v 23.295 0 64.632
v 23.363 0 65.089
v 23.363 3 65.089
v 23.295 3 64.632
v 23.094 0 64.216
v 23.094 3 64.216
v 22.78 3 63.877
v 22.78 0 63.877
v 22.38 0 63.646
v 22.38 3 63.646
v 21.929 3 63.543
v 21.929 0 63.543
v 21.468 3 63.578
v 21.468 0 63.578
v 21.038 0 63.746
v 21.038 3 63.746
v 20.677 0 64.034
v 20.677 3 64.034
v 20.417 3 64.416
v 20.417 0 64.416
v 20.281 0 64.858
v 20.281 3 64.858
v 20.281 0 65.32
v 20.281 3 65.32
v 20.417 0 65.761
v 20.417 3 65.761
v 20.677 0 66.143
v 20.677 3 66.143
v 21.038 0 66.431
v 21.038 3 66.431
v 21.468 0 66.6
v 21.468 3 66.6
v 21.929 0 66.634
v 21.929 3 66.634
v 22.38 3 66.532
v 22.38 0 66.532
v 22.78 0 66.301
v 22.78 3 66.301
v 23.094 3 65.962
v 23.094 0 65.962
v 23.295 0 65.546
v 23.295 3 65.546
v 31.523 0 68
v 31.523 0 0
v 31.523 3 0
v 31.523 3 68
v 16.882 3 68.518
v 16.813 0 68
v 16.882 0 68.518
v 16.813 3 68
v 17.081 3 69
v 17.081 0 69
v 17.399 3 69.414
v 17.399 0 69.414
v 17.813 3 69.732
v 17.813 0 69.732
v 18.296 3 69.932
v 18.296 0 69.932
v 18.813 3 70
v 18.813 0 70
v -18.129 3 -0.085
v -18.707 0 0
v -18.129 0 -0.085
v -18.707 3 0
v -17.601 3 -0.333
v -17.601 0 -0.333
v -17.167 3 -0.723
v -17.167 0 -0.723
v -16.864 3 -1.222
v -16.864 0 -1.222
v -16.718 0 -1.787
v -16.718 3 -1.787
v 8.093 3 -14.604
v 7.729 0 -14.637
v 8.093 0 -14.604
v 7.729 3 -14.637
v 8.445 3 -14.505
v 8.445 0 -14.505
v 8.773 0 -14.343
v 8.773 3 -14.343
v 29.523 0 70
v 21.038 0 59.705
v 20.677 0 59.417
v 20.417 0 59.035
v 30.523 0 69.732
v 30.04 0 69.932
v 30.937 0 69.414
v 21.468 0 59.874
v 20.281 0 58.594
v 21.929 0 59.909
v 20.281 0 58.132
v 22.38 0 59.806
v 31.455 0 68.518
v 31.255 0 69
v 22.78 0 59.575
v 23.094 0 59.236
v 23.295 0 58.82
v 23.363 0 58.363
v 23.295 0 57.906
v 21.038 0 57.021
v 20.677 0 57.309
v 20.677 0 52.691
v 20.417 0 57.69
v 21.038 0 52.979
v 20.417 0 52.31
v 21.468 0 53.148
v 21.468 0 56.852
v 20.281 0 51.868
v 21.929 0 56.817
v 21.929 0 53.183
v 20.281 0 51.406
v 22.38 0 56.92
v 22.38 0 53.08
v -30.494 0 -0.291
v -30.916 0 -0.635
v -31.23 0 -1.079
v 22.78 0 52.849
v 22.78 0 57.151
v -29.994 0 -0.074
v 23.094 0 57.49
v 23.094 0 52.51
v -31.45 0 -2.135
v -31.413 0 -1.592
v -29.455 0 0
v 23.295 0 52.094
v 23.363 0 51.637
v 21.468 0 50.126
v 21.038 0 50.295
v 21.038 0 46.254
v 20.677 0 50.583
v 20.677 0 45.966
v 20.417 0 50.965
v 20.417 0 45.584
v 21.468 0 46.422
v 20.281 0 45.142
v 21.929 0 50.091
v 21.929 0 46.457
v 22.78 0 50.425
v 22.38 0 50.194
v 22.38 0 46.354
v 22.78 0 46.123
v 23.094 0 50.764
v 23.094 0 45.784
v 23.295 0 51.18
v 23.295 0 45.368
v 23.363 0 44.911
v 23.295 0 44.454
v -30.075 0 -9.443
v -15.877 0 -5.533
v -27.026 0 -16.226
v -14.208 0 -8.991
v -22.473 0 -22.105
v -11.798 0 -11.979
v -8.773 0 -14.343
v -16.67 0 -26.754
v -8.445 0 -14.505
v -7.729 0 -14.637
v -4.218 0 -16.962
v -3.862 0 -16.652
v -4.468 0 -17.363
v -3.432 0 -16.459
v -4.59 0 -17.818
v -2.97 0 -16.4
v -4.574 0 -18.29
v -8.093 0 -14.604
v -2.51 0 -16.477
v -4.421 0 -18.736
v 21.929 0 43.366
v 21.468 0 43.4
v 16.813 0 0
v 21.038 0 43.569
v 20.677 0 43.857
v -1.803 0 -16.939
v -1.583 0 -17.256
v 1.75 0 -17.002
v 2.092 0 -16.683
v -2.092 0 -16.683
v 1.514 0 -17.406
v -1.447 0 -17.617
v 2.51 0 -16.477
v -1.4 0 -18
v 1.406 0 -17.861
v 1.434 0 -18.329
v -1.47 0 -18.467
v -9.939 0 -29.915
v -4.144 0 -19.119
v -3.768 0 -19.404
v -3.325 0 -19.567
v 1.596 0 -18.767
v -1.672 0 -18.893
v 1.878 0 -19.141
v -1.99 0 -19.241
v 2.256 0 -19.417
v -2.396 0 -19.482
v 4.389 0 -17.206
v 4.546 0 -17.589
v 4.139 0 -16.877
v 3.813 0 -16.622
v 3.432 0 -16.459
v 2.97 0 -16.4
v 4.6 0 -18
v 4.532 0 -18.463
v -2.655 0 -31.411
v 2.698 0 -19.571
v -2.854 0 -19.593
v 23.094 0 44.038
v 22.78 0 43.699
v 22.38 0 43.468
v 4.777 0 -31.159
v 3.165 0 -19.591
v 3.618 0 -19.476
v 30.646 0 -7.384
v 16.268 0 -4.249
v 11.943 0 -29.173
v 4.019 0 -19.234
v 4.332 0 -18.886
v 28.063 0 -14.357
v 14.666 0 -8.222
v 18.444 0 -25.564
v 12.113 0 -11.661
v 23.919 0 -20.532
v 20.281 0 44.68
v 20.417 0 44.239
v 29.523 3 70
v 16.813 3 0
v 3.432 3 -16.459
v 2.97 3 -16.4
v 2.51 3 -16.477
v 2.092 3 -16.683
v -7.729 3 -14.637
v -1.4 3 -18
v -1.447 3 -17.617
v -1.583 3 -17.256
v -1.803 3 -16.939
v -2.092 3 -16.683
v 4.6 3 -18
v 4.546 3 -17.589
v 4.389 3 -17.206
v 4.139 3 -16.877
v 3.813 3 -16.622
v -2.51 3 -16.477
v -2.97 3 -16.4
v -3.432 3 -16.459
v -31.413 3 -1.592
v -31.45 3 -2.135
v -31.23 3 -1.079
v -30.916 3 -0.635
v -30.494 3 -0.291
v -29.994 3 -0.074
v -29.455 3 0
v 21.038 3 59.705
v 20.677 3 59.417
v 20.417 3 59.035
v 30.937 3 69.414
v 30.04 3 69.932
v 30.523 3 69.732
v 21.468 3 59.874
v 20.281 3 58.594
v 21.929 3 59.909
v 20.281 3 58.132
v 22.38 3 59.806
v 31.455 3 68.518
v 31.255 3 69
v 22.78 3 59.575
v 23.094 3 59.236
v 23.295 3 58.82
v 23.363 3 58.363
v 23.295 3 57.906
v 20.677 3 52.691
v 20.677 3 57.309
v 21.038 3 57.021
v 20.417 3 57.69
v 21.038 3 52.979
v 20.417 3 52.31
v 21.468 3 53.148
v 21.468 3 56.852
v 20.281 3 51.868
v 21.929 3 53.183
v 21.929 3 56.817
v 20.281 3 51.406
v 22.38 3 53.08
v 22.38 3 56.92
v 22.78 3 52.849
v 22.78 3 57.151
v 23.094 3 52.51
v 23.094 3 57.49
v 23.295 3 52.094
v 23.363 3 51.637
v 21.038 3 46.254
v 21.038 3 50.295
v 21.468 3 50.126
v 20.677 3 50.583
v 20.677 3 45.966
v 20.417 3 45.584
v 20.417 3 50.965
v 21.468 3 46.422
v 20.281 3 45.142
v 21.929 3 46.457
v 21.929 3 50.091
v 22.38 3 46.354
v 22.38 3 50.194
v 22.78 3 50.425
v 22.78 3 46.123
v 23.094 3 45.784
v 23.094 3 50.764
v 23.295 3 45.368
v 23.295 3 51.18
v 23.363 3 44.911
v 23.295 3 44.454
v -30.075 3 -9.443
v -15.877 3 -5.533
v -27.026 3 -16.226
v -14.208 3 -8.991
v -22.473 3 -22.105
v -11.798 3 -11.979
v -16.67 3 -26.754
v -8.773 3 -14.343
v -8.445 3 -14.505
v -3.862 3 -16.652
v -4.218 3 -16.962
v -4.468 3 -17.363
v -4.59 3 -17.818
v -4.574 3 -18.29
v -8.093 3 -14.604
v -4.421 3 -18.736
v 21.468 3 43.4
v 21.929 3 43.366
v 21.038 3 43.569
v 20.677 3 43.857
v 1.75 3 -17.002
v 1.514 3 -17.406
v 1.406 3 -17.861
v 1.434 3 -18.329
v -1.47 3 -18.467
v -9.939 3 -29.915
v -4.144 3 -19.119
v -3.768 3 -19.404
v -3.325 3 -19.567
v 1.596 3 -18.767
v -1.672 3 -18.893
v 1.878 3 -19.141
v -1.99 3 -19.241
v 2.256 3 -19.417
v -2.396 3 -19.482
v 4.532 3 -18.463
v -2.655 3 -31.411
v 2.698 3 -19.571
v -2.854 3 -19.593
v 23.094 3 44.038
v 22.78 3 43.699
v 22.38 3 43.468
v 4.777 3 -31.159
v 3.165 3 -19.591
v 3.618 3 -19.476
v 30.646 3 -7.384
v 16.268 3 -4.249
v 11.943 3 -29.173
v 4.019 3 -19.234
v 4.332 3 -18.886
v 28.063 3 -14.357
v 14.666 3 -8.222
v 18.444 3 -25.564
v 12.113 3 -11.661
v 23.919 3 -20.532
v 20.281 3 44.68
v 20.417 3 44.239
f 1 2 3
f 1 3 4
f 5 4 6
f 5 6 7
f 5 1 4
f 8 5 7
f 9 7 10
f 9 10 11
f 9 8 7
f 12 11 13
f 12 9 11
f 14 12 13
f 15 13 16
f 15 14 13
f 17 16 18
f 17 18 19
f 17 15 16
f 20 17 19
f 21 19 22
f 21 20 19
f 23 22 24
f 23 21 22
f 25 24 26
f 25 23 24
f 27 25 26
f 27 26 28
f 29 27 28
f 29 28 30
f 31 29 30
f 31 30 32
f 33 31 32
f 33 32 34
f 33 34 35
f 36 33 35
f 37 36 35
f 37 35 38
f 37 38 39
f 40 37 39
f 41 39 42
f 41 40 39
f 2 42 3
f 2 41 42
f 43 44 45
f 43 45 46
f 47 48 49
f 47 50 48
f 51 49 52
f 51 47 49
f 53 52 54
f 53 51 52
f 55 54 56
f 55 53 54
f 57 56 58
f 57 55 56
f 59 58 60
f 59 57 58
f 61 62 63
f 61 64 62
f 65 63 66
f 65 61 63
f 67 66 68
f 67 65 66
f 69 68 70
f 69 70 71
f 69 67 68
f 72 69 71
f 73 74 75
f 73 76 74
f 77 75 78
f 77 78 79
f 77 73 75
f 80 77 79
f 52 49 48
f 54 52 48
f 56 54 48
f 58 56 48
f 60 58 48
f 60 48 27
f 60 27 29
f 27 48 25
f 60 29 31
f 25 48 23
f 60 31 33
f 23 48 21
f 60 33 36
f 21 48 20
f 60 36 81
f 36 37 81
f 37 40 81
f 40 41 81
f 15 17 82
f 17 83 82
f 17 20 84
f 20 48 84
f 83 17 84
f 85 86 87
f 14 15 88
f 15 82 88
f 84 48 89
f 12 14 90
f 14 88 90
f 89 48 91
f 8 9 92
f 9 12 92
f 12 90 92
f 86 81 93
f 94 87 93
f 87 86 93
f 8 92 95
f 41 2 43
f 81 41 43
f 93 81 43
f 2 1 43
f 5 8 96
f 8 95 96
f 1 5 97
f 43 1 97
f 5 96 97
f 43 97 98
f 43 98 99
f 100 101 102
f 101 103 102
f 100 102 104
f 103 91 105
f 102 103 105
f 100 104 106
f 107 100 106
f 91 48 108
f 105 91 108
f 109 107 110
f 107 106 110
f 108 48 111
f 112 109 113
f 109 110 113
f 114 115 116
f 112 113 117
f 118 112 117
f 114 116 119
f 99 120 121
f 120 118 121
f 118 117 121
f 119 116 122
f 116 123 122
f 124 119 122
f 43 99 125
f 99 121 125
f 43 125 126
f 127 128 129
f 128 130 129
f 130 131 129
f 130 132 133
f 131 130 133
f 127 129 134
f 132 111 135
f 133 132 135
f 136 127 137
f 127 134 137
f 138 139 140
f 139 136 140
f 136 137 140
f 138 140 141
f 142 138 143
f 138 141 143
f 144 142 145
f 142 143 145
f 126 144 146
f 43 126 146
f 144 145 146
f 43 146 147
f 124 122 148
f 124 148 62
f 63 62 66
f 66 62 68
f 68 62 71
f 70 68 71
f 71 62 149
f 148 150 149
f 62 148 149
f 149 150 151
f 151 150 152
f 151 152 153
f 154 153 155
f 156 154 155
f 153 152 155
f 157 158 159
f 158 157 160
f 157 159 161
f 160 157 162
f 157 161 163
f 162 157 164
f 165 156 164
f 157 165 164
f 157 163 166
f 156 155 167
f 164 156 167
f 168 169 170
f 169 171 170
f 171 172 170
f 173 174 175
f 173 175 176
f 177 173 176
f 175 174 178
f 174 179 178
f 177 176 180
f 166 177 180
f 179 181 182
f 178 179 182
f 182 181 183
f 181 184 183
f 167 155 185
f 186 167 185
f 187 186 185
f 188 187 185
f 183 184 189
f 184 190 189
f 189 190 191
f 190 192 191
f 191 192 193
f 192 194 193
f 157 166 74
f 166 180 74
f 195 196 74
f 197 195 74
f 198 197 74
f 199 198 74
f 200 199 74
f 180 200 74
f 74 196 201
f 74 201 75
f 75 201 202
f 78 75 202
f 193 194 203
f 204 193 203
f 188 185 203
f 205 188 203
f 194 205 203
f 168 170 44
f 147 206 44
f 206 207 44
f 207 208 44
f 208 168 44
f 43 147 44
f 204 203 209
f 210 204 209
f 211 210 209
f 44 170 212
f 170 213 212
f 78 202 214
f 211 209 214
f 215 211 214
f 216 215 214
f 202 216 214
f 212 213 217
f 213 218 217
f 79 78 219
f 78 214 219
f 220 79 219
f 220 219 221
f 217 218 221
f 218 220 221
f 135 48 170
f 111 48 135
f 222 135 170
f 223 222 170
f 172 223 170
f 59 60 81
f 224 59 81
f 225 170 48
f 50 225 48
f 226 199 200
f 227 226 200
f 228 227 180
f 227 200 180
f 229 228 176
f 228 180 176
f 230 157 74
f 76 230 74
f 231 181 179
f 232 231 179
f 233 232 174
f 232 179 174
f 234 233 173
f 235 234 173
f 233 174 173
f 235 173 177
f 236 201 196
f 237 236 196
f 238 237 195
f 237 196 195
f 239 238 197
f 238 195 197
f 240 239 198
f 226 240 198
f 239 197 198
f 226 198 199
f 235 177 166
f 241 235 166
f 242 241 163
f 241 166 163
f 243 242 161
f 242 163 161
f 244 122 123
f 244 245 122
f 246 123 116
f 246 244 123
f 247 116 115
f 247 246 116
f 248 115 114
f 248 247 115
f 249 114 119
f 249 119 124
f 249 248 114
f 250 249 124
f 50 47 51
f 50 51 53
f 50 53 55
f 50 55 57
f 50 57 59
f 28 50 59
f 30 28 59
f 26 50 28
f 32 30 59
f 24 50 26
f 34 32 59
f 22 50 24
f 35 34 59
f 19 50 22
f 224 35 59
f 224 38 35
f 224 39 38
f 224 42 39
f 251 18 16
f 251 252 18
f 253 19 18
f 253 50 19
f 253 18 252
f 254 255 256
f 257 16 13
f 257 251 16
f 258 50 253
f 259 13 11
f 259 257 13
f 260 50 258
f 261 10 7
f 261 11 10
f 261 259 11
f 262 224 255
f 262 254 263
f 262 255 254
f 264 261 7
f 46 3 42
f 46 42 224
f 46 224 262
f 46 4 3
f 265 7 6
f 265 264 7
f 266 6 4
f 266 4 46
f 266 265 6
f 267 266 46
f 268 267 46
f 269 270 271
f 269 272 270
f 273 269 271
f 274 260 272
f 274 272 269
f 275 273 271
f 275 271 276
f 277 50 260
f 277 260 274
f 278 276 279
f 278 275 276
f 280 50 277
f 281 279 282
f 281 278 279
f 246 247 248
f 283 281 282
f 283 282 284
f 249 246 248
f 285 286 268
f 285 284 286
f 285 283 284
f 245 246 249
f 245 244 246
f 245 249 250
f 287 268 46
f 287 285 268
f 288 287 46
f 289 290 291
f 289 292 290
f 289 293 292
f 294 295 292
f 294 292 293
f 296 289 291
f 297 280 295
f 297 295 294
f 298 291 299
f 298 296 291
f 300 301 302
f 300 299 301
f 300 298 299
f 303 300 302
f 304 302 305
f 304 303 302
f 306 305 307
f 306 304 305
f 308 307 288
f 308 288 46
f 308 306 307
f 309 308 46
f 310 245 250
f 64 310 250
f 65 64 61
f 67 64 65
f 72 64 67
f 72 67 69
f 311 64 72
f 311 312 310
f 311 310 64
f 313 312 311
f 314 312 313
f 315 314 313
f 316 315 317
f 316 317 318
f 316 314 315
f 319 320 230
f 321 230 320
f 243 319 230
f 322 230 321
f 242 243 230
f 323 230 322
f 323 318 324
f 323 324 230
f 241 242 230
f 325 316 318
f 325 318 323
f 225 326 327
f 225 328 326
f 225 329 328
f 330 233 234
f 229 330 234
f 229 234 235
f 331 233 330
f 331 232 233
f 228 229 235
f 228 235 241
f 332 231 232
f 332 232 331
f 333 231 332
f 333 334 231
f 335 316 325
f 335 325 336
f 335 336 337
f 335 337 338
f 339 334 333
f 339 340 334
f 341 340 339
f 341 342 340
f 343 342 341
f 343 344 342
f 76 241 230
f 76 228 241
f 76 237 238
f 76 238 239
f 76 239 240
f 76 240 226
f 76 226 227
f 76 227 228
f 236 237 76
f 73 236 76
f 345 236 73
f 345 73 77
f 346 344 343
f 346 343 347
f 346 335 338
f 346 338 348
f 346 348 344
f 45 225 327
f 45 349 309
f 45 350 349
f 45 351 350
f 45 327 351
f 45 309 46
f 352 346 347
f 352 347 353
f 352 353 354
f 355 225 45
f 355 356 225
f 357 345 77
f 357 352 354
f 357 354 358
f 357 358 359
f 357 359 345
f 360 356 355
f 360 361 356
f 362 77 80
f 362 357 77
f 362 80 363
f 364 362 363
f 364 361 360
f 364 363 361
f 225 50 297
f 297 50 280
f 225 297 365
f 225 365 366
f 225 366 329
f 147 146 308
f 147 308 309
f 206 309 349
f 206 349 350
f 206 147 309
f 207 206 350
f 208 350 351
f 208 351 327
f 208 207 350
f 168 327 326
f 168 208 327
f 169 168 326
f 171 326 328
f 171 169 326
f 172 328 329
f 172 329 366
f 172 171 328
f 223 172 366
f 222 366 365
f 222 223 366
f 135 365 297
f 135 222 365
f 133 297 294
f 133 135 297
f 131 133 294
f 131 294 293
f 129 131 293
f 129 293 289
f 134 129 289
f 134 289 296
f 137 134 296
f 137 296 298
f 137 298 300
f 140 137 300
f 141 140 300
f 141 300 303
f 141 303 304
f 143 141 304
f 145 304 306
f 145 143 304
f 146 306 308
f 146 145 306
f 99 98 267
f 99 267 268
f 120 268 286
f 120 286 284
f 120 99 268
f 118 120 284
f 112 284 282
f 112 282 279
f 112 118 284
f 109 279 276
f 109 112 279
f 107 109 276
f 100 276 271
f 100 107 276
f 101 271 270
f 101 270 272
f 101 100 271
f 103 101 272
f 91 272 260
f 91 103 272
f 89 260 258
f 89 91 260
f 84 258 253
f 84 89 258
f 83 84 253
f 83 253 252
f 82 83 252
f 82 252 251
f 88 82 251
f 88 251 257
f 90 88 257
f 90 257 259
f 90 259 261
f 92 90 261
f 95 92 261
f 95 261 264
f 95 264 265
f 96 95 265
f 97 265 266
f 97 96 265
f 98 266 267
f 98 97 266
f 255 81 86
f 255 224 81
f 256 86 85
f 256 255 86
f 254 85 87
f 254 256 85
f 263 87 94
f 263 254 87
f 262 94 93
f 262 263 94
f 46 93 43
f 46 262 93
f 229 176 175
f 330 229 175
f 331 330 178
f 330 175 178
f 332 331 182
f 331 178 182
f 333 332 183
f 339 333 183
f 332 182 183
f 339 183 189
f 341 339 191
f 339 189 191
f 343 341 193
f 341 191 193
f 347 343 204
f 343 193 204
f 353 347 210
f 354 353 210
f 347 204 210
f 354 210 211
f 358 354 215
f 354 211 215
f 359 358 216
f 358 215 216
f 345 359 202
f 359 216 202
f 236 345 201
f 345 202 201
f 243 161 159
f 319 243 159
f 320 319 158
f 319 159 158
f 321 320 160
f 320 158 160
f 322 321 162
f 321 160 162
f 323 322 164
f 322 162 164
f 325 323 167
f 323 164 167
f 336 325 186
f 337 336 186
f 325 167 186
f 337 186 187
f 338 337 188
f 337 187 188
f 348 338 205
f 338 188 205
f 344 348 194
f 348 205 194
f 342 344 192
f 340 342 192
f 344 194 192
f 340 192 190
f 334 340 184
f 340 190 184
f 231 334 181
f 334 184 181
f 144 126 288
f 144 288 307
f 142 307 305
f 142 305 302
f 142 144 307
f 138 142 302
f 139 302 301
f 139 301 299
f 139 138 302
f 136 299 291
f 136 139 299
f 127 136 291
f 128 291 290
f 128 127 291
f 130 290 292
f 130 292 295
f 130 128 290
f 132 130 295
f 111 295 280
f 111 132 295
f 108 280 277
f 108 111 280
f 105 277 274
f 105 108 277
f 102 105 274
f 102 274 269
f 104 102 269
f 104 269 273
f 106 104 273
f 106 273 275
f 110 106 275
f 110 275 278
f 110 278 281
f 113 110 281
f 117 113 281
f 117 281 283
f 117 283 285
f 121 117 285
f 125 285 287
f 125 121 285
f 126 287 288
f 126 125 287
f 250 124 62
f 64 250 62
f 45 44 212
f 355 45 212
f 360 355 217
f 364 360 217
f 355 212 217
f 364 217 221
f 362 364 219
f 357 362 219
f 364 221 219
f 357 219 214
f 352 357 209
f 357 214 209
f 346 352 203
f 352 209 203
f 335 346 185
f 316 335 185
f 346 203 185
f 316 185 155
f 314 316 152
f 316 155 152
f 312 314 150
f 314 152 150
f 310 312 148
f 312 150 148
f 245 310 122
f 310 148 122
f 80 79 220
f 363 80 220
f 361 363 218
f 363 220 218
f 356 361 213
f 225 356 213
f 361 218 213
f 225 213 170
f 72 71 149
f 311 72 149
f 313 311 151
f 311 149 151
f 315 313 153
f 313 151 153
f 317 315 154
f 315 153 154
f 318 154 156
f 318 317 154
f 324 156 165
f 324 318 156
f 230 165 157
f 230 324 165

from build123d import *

# Parameters (mm, degrees)
SKETCH2_R           = 1.55
BOSS_EXTRUDE1_DEPTH = 3
FILLET1_R           = 2


with BuildPart() as part:
    # Sketch2 → Boss-Extrude1 (new body)
    with BuildSketch(Plane(origin=(0, 0, 0), x_dir=(1, 0, 0), z_dir=(0, 1, 0))):
        with BuildLine():
            Line((16.8134, 0), (16.8134, -70))
            Line((16.8134, -70), (26.8134, -70))
            Line((26.8134, -70), (26.8134, -40))
            Line((26.8134, -40), (31.5228, 0))
            ThreePointArc((31.5228, 0), (0, 31.5228), (-31.5228, 0))
            Line((-31.5228, 0), (-16.8134, 0))
            ThreePointArc((-16.8134, 0), (-14.522227787, 8.473211887), (-8.27315, 14.63712433))
            ThreePointArc((-8.27315, 14.63712433), (-5.923049404, 15.735561805), (-3.431948685, 16.459409096))
            ThreePointArc((-3.431948685, 16.459409096), (-3.966664912, 19.274974097), (-1.4, 18))
            ThreePointArc((-1.4, 18), (-1.583454565, 17.256092055), (-2.091748789, 16.682775745))
            ThreePointArc((-2.091748789, 16.682775745), (0, 16.8134), (2.091748789, 16.682775745))
            ThreePointArc((2.091748789, 16.682775745), (2.256092055, 19.416545435), (4.6, 18))
            ThreePointArc((4.6, 18), (4.274974097, 17.033335088), (3.431948685, 16.459409096))
            ThreePointArc((3.431948685, 16.459409096), (5.923049404, 15.735561805), (8.27315, 14.63712433))
            ThreePointArc((8.27315, 14.63712433), (14.522227787, 8.473211887), (16.8134, 0))
        make_face()
        with Locations((21.8134, -65.0887)):
            Circle(SKETCH2_R, mode=Mode.SUBTRACT)
        with Locations((21.8134, -58.3629)):
            Circle(SKETCH2_R, mode=Mode.SUBTRACT)
        with Locations((21.8134, -51.6371)):
            Circle(SKETCH2_R, mode=Mode.SUBTRACT)
        with Locations((21.8134, -44.9113)):
            Circle(SKETCH2_R, mode=Mode.SUBTRACT)
        with BuildLine():
            Line((-8.27315, 14.63712433), (8.27315, 14.63712433))
            ThreePointArc((8.27315, 14.63712433), (5.923049404, 15.735561805), (3.431948685, 16.459409096))
            ThreePointArc((3.431948685, 16.459409096), (2.73696162, 16.421769722), (2.091748789, 16.682775745))
            ThreePointArc((2.091748789, 16.682775745), (0, 16.8134), (-2.091748789, 16.682775745))
            ThreePointArc((-2.091748789, 16.682775745), (-2.73696162, 16.421769722), (-3.431948685, 16.459409096))
            ThreePointArc((-3.431948685, 16.459409096), (-5.923049404, 15.735561805), (-8.27315, 14.63712433))
        make_face()
        Polygon((31.5228, -70), (26.8134, -70), (26.8134, -40), (31.5228, 0), align=None)
    extrude(amount=BOSS_EXTRUDE1_DEPTH)

    # Fillet1
    fillet1_edges = [part.edges().sort_by_distance(p)[0] for p in [
        (-16.8134, 1.5, 0),
        (-31.5228, 1.5, 0),
        (31.5228, 1.5, 70),
        (16.8134, 1.5, 70),
        (8.27315, 1.5, -14.63712433),
        (-8.27315, 1.5, -14.63712433),
    ]]
    fillet(fillet1_edges, radius=FILLET1_R)


solid = part.part
